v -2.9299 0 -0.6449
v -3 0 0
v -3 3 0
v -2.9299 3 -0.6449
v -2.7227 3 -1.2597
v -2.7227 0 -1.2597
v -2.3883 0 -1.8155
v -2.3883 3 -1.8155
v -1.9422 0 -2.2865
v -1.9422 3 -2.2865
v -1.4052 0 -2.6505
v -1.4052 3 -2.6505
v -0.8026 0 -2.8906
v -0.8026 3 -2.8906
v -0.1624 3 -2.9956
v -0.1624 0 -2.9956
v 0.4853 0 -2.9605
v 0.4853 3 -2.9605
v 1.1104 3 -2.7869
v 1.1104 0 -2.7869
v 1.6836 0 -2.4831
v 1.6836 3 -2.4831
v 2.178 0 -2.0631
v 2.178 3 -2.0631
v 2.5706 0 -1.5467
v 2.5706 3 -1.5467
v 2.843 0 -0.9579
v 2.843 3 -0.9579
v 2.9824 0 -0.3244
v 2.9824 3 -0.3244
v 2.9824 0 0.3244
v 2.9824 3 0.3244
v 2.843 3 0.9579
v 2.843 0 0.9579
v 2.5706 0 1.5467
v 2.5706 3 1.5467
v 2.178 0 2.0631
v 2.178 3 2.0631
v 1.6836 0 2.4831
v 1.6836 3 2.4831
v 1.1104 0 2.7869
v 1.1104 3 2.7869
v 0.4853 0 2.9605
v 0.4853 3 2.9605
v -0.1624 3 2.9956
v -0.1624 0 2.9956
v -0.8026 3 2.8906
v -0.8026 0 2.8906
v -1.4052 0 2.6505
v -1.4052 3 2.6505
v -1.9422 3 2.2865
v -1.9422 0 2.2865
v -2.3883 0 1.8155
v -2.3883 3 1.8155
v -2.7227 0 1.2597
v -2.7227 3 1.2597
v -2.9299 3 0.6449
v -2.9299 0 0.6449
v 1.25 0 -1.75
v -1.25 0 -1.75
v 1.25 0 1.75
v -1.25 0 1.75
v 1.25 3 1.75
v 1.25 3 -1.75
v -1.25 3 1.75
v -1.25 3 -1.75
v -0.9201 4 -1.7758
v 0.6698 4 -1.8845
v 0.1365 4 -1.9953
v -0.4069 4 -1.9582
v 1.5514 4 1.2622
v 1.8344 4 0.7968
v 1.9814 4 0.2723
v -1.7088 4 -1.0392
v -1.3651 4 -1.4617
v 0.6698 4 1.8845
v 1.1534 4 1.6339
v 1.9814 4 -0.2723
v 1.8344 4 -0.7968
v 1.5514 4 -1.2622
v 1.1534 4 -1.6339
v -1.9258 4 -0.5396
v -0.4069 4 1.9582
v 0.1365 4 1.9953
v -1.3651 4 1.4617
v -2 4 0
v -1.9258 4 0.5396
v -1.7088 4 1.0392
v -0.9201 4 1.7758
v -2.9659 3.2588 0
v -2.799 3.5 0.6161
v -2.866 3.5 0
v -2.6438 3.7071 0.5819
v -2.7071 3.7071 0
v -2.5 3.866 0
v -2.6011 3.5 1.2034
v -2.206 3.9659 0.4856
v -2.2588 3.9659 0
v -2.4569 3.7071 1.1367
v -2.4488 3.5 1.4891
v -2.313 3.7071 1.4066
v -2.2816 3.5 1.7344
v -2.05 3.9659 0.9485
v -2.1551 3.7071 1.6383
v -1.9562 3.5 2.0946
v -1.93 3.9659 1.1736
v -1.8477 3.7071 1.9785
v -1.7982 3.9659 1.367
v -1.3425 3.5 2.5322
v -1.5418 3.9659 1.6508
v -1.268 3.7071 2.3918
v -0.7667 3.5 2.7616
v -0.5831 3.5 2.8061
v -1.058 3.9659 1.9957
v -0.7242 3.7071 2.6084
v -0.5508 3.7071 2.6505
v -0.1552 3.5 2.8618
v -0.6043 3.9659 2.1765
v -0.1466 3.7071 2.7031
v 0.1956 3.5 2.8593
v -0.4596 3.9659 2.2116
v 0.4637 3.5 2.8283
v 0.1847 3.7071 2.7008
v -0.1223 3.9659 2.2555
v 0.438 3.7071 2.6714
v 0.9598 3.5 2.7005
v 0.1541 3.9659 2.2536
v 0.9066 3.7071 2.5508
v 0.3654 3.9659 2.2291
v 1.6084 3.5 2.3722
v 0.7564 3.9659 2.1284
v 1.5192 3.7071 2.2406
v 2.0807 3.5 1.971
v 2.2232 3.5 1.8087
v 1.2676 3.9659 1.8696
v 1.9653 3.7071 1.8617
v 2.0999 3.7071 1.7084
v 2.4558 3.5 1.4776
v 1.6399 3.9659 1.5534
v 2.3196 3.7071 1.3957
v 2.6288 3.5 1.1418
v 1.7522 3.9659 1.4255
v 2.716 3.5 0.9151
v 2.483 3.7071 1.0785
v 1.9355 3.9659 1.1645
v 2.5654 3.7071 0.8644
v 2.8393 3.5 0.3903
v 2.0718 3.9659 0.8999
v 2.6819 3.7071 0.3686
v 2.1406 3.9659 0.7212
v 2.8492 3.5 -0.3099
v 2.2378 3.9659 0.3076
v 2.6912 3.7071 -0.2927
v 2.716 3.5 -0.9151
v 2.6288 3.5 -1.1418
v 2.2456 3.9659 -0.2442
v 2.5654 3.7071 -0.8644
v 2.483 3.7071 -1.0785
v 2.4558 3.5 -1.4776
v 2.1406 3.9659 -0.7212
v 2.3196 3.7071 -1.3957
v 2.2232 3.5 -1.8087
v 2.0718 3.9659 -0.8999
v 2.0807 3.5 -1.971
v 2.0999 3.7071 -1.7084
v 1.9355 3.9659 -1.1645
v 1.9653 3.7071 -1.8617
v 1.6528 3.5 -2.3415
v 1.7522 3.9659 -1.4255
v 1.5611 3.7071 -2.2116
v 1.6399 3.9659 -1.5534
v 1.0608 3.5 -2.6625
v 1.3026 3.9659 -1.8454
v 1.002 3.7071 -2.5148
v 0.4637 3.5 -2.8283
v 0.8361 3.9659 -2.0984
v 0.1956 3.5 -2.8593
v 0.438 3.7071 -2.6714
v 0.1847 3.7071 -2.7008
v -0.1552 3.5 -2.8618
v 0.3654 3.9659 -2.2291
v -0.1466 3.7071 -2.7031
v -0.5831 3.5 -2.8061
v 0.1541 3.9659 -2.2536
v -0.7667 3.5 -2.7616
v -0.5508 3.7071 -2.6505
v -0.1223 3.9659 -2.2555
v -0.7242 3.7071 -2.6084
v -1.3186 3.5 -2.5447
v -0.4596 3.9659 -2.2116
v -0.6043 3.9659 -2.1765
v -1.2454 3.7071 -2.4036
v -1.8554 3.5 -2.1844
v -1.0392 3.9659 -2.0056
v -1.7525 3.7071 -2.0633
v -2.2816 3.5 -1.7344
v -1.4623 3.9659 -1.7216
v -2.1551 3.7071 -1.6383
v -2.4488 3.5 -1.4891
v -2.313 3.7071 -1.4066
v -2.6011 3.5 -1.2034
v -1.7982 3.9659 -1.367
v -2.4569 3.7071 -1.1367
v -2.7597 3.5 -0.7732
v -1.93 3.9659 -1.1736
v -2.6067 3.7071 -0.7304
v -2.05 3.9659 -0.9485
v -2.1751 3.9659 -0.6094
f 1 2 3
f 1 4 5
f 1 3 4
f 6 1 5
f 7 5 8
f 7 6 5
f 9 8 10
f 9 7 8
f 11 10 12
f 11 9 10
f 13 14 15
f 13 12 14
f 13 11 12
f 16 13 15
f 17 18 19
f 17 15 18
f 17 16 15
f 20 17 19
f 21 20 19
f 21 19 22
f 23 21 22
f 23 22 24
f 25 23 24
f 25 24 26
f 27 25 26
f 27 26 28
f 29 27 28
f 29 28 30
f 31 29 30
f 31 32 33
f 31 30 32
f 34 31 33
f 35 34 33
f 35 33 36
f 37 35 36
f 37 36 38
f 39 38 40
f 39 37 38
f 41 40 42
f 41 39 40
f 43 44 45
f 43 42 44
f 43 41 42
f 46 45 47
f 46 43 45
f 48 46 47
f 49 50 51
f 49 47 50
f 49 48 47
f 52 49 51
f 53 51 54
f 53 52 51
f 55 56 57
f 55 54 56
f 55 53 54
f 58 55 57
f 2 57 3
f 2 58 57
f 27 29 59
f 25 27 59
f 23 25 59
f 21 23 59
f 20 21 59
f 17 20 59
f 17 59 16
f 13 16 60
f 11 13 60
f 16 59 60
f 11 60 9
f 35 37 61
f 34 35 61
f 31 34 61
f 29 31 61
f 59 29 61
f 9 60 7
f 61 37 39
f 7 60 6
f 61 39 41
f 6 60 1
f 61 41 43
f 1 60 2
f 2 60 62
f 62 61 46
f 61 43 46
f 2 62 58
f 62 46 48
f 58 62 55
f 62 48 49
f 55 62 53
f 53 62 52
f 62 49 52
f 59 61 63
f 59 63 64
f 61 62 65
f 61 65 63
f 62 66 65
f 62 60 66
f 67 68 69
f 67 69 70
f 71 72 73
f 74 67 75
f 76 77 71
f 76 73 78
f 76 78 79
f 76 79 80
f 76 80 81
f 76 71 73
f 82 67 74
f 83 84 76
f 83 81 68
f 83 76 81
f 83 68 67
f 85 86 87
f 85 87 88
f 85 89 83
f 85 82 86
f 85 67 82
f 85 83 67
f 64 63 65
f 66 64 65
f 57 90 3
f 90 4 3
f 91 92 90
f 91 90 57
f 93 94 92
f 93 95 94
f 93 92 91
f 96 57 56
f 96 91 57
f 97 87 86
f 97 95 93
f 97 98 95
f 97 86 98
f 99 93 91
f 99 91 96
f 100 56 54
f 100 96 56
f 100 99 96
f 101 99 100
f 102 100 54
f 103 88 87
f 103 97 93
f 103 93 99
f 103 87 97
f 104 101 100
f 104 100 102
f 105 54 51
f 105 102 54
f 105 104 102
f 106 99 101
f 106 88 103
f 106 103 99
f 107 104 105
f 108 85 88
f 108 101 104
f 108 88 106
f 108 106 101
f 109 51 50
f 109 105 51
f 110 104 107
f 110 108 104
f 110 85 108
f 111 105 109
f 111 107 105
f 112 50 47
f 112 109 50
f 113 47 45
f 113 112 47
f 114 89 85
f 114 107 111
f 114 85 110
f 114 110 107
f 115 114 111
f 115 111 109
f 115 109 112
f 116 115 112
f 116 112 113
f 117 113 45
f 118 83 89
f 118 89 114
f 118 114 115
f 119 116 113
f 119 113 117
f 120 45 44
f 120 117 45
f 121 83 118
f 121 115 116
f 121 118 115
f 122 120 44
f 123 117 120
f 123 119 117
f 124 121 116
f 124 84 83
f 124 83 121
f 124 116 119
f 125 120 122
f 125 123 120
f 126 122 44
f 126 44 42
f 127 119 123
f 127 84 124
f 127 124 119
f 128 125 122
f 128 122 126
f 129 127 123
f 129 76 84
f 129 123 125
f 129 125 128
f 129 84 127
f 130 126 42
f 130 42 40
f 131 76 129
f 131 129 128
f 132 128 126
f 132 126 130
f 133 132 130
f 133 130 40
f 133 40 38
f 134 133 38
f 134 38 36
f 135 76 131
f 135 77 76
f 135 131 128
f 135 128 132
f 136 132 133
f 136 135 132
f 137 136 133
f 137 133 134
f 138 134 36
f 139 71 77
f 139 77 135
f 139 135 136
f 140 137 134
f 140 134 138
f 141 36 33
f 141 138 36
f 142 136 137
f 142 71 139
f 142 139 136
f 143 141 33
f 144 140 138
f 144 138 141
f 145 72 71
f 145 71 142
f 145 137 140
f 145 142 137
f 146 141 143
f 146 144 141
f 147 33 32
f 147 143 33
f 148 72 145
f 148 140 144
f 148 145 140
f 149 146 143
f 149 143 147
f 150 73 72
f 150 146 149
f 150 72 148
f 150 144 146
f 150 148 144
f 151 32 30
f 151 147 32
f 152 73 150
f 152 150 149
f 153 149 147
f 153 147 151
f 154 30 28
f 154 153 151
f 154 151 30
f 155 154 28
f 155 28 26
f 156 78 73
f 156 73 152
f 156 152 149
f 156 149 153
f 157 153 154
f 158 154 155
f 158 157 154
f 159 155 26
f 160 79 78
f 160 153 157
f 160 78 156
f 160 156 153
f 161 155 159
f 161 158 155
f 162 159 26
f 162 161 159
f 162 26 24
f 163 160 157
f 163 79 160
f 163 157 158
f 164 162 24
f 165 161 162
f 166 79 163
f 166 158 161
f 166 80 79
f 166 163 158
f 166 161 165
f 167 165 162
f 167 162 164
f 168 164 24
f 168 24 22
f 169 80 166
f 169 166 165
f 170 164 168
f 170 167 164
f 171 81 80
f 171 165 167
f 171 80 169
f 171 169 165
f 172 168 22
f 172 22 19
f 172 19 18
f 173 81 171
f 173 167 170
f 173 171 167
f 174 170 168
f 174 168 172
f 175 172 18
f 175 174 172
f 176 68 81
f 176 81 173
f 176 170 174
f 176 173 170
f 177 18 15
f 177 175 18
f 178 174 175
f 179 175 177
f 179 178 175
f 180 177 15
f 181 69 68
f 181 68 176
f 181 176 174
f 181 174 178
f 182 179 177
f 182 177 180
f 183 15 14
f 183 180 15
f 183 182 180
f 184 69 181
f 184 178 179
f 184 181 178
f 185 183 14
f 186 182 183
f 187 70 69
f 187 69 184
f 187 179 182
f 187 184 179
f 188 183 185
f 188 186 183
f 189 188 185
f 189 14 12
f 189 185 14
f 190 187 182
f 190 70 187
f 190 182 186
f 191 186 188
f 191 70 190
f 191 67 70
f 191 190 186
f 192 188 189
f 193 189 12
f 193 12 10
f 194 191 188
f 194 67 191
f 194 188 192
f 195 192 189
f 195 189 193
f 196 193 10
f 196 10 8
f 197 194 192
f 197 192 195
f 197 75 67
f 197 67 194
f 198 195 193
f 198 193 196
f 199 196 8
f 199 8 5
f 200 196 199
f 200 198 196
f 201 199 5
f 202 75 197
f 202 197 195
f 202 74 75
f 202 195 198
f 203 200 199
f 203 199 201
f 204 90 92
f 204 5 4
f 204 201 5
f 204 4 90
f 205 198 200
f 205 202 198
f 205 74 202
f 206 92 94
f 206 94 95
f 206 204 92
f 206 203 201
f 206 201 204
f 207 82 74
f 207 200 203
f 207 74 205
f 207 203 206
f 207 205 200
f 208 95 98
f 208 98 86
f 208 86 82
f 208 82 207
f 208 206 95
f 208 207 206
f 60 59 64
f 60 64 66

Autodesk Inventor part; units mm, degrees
ref_plane "YZ Plane" through (0, 0, 0) normal (1, 0, 0) x (0, 1, 0)
ref_plane "XZ Plane" through (0, 0, 0) normal (0, 1, 0) x (-1, 0, 0)
ref_plane "XY Plane" through (0, 0, 0) normal (0, 0, 1) x (1, 0, 0)
sketch "Sketch1" plane through (0, 0, 0) normal (0, 1, 0) x (-1, 0, 0)
  circle A0 centre (0, 0) radius 3
  line L0 (1.25, 1.75) -> (-1.25, 1.75)
  line L1 (-1.25, 1.75) -> (-1.25, -1.75)
  line L2 (-1.25, -1.75) -> (1.25, -1.75)
  line L3 (1.25, -1.75) -> (1.25, 1.75)
  dimension "d0" = 6
  dimension "d1" = 2.5
  dimension "d2" = 3.5
  dimension "d3" = 1.25
  dimension "d4" = 1.75
extrude "Extrusion1" add sketch "Sketch1" along normal blind 4 contours A0 | L3 L2 L1 L0
extrude "Extrusion2" cut sketch "Sketch1" along normal blind 3 contours L3 L2 L1 L0
fillet "Fillet1" radius 1 1 edges at (3, 4, 0)
properties part number "Power_Button"
